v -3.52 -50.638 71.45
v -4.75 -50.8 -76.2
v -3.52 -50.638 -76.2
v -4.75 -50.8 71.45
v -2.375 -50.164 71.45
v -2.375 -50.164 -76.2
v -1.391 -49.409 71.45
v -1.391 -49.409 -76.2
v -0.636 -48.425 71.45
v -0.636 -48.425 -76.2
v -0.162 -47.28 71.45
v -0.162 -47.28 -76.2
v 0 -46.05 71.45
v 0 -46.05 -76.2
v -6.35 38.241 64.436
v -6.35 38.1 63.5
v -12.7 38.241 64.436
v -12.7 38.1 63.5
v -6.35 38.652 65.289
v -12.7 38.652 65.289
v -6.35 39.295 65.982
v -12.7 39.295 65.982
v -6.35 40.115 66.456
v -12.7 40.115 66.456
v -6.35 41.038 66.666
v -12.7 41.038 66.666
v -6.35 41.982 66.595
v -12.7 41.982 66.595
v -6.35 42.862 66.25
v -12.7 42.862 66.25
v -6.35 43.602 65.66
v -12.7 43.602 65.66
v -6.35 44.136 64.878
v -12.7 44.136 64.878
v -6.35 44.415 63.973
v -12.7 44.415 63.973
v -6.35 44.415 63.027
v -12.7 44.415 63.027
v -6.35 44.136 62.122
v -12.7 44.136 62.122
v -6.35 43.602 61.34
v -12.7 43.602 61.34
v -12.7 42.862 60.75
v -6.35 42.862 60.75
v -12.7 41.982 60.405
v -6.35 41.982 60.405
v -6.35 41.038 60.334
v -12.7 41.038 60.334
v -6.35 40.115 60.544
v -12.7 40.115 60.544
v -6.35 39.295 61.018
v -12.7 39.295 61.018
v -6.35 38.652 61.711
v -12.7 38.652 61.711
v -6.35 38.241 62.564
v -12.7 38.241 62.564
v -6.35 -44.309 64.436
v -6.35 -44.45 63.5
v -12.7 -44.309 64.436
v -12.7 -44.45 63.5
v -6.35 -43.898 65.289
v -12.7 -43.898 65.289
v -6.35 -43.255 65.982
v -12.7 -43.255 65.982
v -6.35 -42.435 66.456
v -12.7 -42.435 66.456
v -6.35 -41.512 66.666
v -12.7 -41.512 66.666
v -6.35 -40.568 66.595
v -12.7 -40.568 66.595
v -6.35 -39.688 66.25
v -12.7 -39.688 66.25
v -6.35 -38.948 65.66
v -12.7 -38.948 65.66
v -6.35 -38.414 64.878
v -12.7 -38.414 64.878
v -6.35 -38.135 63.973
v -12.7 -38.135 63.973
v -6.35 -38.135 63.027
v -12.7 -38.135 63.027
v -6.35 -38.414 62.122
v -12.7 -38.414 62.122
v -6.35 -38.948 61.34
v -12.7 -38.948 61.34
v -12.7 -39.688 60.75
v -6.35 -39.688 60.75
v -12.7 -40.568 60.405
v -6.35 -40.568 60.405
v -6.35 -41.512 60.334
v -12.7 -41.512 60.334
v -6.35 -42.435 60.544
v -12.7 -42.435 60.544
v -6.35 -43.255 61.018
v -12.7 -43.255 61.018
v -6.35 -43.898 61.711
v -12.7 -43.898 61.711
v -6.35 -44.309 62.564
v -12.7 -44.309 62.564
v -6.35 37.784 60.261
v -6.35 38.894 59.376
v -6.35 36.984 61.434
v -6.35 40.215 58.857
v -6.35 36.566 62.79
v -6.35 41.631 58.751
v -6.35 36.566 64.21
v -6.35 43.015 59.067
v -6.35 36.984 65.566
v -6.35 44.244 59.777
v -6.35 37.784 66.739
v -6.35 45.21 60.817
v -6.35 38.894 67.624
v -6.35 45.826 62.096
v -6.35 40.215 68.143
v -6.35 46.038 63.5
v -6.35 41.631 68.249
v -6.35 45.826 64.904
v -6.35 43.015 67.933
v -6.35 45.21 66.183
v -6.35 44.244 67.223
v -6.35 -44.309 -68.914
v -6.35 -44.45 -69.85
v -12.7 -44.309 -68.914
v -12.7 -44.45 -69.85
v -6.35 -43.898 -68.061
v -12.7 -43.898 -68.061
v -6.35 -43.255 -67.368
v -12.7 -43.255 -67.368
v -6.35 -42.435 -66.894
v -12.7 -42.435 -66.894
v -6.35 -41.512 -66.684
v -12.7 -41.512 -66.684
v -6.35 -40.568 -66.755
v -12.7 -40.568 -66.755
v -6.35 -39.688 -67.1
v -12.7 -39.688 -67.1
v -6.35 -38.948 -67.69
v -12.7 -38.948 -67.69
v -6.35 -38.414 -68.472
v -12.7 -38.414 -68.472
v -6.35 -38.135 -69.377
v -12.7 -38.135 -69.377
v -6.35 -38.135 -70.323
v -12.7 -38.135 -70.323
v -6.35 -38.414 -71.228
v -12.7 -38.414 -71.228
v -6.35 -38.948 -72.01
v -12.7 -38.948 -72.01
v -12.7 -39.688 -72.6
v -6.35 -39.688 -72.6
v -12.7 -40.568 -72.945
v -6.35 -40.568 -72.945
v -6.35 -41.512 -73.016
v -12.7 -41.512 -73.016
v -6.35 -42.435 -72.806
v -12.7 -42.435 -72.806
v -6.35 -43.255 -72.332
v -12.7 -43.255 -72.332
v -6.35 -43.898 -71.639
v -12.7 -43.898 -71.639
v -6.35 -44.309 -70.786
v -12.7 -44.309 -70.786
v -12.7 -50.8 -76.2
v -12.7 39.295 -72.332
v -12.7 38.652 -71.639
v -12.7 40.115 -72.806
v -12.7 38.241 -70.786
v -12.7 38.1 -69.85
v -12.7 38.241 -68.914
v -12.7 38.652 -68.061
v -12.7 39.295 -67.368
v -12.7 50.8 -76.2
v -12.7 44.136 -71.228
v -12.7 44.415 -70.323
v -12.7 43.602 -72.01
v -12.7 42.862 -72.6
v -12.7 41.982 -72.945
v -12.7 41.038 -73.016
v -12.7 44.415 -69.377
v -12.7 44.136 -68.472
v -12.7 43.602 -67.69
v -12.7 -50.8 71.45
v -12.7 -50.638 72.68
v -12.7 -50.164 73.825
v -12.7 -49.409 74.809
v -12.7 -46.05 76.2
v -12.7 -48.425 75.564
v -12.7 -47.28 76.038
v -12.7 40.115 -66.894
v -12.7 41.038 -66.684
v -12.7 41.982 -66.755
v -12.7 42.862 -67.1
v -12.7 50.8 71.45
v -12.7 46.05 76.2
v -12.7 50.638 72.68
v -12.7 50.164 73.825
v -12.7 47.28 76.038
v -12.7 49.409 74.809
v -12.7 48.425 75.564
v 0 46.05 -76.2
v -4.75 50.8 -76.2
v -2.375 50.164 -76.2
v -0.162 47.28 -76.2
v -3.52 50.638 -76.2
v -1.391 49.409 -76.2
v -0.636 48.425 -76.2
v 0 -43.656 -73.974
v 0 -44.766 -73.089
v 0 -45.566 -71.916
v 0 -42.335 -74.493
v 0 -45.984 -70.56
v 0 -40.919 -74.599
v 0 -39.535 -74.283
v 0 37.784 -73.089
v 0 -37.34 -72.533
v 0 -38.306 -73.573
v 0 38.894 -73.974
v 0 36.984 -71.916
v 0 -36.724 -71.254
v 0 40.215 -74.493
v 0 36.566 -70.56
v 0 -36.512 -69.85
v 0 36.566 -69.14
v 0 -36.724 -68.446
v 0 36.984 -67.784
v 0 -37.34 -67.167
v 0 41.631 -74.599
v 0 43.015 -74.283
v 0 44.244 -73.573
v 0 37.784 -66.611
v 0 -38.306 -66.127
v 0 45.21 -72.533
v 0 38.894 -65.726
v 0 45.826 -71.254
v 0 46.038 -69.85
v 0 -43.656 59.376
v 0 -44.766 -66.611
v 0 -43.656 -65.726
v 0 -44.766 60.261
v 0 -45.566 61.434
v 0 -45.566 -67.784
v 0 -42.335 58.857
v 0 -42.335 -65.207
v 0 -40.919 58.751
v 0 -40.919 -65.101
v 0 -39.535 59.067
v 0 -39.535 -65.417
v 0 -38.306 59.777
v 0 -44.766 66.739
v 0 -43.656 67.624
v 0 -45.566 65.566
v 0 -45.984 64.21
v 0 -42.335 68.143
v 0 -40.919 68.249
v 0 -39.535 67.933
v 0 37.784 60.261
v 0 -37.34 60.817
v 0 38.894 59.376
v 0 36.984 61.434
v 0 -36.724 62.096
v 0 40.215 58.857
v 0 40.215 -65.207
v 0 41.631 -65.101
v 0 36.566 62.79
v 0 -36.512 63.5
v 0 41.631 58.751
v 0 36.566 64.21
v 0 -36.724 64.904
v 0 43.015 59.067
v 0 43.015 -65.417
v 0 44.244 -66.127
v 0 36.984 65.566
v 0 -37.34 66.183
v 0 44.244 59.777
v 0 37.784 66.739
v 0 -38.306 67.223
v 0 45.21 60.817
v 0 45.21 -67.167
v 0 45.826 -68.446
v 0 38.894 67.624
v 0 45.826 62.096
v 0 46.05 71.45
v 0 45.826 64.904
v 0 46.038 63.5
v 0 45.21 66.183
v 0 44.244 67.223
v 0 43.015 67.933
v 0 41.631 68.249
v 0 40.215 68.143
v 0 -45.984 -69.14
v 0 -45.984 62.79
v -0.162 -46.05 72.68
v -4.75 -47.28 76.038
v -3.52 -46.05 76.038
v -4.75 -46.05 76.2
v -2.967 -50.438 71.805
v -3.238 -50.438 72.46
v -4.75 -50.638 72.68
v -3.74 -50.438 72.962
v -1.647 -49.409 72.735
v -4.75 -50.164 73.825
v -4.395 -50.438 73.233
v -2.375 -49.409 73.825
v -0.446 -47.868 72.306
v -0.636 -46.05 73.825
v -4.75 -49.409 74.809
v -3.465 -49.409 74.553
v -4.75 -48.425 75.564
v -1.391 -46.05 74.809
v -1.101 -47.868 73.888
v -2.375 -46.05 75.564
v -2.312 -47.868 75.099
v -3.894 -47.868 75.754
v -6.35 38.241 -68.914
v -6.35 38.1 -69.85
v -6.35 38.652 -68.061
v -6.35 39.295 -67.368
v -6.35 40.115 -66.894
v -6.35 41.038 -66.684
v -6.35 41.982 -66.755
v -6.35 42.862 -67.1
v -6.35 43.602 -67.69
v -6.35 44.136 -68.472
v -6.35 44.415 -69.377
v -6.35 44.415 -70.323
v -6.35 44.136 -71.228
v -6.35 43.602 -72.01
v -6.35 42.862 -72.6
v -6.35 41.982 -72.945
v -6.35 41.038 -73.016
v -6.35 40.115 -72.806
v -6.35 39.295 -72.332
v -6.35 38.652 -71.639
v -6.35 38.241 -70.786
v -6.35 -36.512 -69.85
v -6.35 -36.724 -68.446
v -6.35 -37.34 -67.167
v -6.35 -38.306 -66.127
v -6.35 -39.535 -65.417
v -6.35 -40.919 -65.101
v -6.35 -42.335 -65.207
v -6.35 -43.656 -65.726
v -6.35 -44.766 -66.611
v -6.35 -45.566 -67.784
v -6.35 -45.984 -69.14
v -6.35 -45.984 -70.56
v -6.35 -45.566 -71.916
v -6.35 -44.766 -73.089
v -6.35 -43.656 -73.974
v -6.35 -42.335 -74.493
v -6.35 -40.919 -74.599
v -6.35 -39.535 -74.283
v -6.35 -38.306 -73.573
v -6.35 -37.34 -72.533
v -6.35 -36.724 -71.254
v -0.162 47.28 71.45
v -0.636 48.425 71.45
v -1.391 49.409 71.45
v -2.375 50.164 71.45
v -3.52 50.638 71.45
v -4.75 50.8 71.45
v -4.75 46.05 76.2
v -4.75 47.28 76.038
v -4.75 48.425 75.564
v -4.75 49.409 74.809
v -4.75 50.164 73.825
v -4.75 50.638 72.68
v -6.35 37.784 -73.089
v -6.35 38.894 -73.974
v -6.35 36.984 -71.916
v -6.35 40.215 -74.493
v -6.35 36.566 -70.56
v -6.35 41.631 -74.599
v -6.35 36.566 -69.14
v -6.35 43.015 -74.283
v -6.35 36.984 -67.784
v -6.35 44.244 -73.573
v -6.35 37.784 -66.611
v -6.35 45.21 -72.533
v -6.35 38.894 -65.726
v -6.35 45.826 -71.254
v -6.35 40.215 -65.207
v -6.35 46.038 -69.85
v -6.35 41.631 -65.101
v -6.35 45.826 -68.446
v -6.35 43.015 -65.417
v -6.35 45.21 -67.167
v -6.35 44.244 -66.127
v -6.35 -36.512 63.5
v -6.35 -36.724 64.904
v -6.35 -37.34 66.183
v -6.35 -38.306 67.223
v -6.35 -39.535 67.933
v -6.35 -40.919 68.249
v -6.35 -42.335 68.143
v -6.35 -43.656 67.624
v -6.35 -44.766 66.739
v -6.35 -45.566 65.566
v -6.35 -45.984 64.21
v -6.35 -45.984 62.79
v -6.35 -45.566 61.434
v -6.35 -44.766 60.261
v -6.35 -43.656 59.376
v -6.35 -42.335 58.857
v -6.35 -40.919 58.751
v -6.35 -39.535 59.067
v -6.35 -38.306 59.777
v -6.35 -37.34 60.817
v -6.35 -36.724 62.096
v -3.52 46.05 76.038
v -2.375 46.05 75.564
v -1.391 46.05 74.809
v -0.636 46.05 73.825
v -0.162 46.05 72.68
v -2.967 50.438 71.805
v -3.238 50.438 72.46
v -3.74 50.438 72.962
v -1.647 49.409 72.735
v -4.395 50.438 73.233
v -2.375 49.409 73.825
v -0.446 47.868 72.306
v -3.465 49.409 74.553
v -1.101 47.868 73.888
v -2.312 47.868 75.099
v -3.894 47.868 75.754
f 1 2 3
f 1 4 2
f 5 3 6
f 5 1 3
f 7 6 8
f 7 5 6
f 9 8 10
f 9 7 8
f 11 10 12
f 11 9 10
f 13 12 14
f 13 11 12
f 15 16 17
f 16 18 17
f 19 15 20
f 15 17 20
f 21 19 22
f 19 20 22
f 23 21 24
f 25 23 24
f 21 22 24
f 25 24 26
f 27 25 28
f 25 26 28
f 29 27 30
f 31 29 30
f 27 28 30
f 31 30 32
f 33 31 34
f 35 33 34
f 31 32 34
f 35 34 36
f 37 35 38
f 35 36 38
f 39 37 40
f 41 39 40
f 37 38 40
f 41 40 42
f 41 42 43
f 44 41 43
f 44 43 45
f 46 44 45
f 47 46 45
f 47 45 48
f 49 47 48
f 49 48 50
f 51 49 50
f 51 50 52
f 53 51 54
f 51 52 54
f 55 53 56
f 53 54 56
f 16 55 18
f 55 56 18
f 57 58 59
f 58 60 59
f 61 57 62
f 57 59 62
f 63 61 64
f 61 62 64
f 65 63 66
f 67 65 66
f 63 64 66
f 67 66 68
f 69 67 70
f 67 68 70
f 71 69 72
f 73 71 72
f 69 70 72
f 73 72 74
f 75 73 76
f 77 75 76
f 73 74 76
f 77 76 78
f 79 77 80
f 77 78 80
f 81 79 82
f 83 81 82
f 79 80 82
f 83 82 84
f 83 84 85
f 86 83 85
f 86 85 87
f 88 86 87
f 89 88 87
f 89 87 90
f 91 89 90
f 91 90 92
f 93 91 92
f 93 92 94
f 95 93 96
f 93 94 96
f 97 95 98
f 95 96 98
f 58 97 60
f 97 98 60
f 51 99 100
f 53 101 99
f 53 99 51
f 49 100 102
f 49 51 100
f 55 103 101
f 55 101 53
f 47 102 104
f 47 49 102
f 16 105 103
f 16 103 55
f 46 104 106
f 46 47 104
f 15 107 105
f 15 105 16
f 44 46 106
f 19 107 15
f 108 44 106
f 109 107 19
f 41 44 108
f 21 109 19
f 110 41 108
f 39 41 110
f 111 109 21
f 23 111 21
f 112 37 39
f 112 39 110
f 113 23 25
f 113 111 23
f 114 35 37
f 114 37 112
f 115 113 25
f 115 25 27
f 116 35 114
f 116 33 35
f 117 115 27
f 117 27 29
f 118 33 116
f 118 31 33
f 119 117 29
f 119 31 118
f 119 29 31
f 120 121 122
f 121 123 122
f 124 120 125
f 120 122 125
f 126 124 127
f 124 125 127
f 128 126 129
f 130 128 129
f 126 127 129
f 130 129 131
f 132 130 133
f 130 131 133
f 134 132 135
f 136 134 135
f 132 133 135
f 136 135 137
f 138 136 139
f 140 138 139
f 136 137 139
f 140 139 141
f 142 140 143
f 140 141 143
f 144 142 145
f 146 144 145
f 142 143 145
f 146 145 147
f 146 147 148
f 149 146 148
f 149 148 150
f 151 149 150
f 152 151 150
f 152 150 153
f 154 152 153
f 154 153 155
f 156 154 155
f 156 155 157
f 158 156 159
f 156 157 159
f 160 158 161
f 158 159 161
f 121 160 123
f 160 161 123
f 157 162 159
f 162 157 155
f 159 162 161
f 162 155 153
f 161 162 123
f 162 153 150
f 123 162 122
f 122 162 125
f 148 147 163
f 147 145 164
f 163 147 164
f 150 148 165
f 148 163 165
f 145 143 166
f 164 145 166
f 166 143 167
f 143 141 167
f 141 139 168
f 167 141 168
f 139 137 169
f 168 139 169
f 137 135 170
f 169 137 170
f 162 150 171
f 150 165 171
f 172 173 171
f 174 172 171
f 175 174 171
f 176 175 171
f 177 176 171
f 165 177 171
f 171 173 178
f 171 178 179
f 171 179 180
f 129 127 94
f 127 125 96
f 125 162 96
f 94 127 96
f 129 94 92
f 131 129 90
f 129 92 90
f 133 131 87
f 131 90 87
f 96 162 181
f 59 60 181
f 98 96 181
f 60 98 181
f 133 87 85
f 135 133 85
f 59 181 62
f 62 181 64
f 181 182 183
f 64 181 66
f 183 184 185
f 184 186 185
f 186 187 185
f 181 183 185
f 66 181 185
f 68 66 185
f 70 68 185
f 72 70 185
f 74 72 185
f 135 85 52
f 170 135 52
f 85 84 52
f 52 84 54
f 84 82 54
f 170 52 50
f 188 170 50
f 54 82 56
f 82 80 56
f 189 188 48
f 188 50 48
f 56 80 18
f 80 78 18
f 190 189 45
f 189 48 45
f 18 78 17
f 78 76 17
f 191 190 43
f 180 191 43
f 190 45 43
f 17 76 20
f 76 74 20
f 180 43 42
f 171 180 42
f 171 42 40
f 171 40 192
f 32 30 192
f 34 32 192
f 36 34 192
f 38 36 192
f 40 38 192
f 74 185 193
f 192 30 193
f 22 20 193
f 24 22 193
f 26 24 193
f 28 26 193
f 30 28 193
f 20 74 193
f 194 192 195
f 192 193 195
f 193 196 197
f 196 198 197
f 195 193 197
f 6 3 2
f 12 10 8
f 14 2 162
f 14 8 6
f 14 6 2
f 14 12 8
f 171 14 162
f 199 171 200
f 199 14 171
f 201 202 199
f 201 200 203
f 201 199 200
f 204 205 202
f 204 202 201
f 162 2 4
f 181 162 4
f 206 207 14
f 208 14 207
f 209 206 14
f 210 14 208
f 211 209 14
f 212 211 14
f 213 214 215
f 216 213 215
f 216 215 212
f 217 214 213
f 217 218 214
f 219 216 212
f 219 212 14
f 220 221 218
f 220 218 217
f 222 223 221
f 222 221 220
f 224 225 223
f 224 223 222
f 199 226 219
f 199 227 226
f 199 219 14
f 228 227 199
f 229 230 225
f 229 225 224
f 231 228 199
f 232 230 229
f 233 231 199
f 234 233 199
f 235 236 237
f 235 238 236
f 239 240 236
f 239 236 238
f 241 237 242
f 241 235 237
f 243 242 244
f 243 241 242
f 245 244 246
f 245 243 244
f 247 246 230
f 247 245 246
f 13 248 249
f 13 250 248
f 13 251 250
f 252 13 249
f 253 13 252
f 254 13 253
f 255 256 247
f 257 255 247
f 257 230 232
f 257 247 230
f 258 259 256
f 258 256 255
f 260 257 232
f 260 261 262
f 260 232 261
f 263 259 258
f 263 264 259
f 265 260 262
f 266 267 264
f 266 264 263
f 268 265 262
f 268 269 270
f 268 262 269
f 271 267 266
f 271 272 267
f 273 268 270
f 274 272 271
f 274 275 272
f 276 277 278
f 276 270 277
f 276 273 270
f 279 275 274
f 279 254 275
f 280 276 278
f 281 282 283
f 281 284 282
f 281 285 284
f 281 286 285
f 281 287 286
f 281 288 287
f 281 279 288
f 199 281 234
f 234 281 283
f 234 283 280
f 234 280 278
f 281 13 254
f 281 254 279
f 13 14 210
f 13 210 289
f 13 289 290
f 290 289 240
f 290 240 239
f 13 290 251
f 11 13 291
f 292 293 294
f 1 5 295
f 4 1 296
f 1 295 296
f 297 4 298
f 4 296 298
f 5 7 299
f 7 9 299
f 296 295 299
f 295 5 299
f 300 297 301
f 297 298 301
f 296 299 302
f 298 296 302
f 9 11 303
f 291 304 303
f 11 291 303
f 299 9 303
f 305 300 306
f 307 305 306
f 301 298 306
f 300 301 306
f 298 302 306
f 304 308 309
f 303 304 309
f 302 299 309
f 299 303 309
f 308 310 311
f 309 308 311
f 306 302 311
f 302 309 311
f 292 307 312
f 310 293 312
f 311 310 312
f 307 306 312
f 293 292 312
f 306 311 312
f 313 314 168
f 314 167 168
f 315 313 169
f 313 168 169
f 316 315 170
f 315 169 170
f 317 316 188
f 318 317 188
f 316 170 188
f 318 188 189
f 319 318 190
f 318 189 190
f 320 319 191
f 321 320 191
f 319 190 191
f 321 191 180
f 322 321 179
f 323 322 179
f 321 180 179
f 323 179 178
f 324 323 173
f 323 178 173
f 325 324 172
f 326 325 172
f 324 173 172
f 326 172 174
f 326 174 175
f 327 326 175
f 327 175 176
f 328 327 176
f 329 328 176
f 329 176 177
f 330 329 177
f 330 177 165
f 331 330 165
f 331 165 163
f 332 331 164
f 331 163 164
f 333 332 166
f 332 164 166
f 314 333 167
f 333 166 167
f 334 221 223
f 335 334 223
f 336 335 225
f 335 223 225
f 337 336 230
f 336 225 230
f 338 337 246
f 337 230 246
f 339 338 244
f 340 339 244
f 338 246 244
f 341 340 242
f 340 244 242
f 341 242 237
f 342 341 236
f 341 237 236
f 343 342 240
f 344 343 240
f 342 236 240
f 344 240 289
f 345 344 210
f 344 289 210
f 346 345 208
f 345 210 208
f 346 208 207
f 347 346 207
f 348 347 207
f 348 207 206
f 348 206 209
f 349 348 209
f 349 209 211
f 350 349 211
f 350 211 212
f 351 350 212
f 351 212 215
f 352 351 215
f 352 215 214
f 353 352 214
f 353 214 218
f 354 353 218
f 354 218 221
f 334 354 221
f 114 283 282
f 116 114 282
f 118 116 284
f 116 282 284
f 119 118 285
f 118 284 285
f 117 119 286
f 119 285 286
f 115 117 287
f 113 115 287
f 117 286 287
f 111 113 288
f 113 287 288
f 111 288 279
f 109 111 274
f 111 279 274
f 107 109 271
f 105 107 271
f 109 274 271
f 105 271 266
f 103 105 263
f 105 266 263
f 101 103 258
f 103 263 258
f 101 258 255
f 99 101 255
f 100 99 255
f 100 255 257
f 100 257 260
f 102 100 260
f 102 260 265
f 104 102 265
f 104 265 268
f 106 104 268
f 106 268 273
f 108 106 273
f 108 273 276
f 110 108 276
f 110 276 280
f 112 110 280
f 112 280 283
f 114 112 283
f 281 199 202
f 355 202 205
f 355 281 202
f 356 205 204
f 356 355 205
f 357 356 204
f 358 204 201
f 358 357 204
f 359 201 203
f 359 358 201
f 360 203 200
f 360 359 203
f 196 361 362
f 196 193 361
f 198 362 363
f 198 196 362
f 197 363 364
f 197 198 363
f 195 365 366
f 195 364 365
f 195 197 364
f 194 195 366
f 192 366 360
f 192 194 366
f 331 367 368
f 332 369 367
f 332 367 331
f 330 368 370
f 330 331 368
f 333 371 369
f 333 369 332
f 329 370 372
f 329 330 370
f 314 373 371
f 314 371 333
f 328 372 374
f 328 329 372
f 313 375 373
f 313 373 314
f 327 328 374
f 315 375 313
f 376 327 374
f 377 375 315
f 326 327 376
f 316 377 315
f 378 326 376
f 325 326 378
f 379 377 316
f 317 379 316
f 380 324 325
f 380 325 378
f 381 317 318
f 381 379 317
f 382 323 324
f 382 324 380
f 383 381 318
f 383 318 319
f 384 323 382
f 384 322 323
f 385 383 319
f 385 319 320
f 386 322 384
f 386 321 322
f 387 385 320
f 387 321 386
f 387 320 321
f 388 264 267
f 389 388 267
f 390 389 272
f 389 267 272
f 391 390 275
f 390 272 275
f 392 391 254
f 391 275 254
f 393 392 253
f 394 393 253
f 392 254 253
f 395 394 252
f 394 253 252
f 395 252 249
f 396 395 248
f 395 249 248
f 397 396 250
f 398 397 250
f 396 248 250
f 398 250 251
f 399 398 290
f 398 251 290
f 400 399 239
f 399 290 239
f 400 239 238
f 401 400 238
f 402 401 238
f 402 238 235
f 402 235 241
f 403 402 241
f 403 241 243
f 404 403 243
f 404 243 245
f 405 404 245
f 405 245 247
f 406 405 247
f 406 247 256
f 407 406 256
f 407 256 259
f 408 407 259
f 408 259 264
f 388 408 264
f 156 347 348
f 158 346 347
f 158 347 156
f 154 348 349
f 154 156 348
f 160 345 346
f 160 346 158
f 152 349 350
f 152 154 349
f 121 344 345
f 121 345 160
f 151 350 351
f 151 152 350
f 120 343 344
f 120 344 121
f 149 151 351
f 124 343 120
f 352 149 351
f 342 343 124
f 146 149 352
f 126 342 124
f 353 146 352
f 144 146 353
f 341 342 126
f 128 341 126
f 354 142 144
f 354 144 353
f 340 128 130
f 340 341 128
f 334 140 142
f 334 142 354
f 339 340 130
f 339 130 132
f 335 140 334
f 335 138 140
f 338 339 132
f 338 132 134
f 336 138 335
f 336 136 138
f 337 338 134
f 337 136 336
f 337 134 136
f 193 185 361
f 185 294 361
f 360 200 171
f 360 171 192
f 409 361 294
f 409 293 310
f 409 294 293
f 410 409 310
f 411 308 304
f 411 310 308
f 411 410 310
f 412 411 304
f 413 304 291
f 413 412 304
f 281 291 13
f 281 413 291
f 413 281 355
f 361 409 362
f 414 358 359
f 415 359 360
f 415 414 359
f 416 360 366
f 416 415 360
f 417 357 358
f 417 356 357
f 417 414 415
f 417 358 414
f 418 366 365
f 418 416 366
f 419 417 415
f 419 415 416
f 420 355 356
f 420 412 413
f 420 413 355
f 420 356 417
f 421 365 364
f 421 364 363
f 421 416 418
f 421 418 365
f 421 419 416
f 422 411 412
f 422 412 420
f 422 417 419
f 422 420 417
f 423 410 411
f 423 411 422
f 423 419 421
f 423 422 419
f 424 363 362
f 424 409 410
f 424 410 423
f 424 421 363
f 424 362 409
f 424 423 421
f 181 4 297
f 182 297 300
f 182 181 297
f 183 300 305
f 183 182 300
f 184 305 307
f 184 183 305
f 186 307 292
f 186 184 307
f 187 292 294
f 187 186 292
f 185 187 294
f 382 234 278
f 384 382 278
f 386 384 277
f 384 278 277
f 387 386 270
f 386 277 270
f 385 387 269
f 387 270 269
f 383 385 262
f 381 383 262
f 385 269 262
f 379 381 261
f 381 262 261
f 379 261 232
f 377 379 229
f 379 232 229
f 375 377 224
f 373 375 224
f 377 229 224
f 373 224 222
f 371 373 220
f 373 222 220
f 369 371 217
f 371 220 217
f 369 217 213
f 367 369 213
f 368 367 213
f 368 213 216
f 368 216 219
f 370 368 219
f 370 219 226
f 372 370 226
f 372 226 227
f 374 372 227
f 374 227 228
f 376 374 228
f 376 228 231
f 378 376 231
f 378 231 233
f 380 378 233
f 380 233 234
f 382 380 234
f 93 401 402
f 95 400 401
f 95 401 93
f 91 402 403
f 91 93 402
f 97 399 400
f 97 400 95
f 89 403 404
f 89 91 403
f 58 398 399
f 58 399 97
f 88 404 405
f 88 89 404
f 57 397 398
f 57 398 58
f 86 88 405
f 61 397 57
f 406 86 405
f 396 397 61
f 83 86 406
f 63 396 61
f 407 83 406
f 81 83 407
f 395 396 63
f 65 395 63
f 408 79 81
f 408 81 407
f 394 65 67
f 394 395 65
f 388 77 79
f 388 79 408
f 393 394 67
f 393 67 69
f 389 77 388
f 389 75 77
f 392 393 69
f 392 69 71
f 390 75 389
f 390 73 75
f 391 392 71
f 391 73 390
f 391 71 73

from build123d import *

# Parameters (mm, degrees)
F0_W           = 101.6
F0_H           = 152.4
F1_DEPTH       = 12.7
F2_D           = 6.35
F2_CBORE_D     = 9.525
F2_CBORE_DEPTH = 6.35
F3_R           = 4.7498


with BuildPart() as f1:
    # F0 (on Right) → F1 (new body)
    with BuildSketch(Plane.YZ):
        Rectangle(F0_W, F0_H)
    extrude(amount=-F1_DEPTH)

    # F2 (through all)
    with Locations(Plane.YZ):
        with Locations((-41.275, -69.85), (41.275, -69.85), (-41.275, 63.5), (41.275, 63.5)):
            CounterBoreHole(F2_D / 2, F2_CBORE_D / 2, F2_CBORE_DEPTH)

    # F3
    f3_edges = [f1.edges().sort_by_distance(p)[0] for p in [
        (0, 0, 76.2),
        (0, -50.8, 0),
        (0, 50.8, 0),
        (-6.35, -50.8, 76.2),
        (-6.35, 50.8, 76.2),
    ]]
    fillet(f3_edges, radius=F3_R)


solid = f1.part
